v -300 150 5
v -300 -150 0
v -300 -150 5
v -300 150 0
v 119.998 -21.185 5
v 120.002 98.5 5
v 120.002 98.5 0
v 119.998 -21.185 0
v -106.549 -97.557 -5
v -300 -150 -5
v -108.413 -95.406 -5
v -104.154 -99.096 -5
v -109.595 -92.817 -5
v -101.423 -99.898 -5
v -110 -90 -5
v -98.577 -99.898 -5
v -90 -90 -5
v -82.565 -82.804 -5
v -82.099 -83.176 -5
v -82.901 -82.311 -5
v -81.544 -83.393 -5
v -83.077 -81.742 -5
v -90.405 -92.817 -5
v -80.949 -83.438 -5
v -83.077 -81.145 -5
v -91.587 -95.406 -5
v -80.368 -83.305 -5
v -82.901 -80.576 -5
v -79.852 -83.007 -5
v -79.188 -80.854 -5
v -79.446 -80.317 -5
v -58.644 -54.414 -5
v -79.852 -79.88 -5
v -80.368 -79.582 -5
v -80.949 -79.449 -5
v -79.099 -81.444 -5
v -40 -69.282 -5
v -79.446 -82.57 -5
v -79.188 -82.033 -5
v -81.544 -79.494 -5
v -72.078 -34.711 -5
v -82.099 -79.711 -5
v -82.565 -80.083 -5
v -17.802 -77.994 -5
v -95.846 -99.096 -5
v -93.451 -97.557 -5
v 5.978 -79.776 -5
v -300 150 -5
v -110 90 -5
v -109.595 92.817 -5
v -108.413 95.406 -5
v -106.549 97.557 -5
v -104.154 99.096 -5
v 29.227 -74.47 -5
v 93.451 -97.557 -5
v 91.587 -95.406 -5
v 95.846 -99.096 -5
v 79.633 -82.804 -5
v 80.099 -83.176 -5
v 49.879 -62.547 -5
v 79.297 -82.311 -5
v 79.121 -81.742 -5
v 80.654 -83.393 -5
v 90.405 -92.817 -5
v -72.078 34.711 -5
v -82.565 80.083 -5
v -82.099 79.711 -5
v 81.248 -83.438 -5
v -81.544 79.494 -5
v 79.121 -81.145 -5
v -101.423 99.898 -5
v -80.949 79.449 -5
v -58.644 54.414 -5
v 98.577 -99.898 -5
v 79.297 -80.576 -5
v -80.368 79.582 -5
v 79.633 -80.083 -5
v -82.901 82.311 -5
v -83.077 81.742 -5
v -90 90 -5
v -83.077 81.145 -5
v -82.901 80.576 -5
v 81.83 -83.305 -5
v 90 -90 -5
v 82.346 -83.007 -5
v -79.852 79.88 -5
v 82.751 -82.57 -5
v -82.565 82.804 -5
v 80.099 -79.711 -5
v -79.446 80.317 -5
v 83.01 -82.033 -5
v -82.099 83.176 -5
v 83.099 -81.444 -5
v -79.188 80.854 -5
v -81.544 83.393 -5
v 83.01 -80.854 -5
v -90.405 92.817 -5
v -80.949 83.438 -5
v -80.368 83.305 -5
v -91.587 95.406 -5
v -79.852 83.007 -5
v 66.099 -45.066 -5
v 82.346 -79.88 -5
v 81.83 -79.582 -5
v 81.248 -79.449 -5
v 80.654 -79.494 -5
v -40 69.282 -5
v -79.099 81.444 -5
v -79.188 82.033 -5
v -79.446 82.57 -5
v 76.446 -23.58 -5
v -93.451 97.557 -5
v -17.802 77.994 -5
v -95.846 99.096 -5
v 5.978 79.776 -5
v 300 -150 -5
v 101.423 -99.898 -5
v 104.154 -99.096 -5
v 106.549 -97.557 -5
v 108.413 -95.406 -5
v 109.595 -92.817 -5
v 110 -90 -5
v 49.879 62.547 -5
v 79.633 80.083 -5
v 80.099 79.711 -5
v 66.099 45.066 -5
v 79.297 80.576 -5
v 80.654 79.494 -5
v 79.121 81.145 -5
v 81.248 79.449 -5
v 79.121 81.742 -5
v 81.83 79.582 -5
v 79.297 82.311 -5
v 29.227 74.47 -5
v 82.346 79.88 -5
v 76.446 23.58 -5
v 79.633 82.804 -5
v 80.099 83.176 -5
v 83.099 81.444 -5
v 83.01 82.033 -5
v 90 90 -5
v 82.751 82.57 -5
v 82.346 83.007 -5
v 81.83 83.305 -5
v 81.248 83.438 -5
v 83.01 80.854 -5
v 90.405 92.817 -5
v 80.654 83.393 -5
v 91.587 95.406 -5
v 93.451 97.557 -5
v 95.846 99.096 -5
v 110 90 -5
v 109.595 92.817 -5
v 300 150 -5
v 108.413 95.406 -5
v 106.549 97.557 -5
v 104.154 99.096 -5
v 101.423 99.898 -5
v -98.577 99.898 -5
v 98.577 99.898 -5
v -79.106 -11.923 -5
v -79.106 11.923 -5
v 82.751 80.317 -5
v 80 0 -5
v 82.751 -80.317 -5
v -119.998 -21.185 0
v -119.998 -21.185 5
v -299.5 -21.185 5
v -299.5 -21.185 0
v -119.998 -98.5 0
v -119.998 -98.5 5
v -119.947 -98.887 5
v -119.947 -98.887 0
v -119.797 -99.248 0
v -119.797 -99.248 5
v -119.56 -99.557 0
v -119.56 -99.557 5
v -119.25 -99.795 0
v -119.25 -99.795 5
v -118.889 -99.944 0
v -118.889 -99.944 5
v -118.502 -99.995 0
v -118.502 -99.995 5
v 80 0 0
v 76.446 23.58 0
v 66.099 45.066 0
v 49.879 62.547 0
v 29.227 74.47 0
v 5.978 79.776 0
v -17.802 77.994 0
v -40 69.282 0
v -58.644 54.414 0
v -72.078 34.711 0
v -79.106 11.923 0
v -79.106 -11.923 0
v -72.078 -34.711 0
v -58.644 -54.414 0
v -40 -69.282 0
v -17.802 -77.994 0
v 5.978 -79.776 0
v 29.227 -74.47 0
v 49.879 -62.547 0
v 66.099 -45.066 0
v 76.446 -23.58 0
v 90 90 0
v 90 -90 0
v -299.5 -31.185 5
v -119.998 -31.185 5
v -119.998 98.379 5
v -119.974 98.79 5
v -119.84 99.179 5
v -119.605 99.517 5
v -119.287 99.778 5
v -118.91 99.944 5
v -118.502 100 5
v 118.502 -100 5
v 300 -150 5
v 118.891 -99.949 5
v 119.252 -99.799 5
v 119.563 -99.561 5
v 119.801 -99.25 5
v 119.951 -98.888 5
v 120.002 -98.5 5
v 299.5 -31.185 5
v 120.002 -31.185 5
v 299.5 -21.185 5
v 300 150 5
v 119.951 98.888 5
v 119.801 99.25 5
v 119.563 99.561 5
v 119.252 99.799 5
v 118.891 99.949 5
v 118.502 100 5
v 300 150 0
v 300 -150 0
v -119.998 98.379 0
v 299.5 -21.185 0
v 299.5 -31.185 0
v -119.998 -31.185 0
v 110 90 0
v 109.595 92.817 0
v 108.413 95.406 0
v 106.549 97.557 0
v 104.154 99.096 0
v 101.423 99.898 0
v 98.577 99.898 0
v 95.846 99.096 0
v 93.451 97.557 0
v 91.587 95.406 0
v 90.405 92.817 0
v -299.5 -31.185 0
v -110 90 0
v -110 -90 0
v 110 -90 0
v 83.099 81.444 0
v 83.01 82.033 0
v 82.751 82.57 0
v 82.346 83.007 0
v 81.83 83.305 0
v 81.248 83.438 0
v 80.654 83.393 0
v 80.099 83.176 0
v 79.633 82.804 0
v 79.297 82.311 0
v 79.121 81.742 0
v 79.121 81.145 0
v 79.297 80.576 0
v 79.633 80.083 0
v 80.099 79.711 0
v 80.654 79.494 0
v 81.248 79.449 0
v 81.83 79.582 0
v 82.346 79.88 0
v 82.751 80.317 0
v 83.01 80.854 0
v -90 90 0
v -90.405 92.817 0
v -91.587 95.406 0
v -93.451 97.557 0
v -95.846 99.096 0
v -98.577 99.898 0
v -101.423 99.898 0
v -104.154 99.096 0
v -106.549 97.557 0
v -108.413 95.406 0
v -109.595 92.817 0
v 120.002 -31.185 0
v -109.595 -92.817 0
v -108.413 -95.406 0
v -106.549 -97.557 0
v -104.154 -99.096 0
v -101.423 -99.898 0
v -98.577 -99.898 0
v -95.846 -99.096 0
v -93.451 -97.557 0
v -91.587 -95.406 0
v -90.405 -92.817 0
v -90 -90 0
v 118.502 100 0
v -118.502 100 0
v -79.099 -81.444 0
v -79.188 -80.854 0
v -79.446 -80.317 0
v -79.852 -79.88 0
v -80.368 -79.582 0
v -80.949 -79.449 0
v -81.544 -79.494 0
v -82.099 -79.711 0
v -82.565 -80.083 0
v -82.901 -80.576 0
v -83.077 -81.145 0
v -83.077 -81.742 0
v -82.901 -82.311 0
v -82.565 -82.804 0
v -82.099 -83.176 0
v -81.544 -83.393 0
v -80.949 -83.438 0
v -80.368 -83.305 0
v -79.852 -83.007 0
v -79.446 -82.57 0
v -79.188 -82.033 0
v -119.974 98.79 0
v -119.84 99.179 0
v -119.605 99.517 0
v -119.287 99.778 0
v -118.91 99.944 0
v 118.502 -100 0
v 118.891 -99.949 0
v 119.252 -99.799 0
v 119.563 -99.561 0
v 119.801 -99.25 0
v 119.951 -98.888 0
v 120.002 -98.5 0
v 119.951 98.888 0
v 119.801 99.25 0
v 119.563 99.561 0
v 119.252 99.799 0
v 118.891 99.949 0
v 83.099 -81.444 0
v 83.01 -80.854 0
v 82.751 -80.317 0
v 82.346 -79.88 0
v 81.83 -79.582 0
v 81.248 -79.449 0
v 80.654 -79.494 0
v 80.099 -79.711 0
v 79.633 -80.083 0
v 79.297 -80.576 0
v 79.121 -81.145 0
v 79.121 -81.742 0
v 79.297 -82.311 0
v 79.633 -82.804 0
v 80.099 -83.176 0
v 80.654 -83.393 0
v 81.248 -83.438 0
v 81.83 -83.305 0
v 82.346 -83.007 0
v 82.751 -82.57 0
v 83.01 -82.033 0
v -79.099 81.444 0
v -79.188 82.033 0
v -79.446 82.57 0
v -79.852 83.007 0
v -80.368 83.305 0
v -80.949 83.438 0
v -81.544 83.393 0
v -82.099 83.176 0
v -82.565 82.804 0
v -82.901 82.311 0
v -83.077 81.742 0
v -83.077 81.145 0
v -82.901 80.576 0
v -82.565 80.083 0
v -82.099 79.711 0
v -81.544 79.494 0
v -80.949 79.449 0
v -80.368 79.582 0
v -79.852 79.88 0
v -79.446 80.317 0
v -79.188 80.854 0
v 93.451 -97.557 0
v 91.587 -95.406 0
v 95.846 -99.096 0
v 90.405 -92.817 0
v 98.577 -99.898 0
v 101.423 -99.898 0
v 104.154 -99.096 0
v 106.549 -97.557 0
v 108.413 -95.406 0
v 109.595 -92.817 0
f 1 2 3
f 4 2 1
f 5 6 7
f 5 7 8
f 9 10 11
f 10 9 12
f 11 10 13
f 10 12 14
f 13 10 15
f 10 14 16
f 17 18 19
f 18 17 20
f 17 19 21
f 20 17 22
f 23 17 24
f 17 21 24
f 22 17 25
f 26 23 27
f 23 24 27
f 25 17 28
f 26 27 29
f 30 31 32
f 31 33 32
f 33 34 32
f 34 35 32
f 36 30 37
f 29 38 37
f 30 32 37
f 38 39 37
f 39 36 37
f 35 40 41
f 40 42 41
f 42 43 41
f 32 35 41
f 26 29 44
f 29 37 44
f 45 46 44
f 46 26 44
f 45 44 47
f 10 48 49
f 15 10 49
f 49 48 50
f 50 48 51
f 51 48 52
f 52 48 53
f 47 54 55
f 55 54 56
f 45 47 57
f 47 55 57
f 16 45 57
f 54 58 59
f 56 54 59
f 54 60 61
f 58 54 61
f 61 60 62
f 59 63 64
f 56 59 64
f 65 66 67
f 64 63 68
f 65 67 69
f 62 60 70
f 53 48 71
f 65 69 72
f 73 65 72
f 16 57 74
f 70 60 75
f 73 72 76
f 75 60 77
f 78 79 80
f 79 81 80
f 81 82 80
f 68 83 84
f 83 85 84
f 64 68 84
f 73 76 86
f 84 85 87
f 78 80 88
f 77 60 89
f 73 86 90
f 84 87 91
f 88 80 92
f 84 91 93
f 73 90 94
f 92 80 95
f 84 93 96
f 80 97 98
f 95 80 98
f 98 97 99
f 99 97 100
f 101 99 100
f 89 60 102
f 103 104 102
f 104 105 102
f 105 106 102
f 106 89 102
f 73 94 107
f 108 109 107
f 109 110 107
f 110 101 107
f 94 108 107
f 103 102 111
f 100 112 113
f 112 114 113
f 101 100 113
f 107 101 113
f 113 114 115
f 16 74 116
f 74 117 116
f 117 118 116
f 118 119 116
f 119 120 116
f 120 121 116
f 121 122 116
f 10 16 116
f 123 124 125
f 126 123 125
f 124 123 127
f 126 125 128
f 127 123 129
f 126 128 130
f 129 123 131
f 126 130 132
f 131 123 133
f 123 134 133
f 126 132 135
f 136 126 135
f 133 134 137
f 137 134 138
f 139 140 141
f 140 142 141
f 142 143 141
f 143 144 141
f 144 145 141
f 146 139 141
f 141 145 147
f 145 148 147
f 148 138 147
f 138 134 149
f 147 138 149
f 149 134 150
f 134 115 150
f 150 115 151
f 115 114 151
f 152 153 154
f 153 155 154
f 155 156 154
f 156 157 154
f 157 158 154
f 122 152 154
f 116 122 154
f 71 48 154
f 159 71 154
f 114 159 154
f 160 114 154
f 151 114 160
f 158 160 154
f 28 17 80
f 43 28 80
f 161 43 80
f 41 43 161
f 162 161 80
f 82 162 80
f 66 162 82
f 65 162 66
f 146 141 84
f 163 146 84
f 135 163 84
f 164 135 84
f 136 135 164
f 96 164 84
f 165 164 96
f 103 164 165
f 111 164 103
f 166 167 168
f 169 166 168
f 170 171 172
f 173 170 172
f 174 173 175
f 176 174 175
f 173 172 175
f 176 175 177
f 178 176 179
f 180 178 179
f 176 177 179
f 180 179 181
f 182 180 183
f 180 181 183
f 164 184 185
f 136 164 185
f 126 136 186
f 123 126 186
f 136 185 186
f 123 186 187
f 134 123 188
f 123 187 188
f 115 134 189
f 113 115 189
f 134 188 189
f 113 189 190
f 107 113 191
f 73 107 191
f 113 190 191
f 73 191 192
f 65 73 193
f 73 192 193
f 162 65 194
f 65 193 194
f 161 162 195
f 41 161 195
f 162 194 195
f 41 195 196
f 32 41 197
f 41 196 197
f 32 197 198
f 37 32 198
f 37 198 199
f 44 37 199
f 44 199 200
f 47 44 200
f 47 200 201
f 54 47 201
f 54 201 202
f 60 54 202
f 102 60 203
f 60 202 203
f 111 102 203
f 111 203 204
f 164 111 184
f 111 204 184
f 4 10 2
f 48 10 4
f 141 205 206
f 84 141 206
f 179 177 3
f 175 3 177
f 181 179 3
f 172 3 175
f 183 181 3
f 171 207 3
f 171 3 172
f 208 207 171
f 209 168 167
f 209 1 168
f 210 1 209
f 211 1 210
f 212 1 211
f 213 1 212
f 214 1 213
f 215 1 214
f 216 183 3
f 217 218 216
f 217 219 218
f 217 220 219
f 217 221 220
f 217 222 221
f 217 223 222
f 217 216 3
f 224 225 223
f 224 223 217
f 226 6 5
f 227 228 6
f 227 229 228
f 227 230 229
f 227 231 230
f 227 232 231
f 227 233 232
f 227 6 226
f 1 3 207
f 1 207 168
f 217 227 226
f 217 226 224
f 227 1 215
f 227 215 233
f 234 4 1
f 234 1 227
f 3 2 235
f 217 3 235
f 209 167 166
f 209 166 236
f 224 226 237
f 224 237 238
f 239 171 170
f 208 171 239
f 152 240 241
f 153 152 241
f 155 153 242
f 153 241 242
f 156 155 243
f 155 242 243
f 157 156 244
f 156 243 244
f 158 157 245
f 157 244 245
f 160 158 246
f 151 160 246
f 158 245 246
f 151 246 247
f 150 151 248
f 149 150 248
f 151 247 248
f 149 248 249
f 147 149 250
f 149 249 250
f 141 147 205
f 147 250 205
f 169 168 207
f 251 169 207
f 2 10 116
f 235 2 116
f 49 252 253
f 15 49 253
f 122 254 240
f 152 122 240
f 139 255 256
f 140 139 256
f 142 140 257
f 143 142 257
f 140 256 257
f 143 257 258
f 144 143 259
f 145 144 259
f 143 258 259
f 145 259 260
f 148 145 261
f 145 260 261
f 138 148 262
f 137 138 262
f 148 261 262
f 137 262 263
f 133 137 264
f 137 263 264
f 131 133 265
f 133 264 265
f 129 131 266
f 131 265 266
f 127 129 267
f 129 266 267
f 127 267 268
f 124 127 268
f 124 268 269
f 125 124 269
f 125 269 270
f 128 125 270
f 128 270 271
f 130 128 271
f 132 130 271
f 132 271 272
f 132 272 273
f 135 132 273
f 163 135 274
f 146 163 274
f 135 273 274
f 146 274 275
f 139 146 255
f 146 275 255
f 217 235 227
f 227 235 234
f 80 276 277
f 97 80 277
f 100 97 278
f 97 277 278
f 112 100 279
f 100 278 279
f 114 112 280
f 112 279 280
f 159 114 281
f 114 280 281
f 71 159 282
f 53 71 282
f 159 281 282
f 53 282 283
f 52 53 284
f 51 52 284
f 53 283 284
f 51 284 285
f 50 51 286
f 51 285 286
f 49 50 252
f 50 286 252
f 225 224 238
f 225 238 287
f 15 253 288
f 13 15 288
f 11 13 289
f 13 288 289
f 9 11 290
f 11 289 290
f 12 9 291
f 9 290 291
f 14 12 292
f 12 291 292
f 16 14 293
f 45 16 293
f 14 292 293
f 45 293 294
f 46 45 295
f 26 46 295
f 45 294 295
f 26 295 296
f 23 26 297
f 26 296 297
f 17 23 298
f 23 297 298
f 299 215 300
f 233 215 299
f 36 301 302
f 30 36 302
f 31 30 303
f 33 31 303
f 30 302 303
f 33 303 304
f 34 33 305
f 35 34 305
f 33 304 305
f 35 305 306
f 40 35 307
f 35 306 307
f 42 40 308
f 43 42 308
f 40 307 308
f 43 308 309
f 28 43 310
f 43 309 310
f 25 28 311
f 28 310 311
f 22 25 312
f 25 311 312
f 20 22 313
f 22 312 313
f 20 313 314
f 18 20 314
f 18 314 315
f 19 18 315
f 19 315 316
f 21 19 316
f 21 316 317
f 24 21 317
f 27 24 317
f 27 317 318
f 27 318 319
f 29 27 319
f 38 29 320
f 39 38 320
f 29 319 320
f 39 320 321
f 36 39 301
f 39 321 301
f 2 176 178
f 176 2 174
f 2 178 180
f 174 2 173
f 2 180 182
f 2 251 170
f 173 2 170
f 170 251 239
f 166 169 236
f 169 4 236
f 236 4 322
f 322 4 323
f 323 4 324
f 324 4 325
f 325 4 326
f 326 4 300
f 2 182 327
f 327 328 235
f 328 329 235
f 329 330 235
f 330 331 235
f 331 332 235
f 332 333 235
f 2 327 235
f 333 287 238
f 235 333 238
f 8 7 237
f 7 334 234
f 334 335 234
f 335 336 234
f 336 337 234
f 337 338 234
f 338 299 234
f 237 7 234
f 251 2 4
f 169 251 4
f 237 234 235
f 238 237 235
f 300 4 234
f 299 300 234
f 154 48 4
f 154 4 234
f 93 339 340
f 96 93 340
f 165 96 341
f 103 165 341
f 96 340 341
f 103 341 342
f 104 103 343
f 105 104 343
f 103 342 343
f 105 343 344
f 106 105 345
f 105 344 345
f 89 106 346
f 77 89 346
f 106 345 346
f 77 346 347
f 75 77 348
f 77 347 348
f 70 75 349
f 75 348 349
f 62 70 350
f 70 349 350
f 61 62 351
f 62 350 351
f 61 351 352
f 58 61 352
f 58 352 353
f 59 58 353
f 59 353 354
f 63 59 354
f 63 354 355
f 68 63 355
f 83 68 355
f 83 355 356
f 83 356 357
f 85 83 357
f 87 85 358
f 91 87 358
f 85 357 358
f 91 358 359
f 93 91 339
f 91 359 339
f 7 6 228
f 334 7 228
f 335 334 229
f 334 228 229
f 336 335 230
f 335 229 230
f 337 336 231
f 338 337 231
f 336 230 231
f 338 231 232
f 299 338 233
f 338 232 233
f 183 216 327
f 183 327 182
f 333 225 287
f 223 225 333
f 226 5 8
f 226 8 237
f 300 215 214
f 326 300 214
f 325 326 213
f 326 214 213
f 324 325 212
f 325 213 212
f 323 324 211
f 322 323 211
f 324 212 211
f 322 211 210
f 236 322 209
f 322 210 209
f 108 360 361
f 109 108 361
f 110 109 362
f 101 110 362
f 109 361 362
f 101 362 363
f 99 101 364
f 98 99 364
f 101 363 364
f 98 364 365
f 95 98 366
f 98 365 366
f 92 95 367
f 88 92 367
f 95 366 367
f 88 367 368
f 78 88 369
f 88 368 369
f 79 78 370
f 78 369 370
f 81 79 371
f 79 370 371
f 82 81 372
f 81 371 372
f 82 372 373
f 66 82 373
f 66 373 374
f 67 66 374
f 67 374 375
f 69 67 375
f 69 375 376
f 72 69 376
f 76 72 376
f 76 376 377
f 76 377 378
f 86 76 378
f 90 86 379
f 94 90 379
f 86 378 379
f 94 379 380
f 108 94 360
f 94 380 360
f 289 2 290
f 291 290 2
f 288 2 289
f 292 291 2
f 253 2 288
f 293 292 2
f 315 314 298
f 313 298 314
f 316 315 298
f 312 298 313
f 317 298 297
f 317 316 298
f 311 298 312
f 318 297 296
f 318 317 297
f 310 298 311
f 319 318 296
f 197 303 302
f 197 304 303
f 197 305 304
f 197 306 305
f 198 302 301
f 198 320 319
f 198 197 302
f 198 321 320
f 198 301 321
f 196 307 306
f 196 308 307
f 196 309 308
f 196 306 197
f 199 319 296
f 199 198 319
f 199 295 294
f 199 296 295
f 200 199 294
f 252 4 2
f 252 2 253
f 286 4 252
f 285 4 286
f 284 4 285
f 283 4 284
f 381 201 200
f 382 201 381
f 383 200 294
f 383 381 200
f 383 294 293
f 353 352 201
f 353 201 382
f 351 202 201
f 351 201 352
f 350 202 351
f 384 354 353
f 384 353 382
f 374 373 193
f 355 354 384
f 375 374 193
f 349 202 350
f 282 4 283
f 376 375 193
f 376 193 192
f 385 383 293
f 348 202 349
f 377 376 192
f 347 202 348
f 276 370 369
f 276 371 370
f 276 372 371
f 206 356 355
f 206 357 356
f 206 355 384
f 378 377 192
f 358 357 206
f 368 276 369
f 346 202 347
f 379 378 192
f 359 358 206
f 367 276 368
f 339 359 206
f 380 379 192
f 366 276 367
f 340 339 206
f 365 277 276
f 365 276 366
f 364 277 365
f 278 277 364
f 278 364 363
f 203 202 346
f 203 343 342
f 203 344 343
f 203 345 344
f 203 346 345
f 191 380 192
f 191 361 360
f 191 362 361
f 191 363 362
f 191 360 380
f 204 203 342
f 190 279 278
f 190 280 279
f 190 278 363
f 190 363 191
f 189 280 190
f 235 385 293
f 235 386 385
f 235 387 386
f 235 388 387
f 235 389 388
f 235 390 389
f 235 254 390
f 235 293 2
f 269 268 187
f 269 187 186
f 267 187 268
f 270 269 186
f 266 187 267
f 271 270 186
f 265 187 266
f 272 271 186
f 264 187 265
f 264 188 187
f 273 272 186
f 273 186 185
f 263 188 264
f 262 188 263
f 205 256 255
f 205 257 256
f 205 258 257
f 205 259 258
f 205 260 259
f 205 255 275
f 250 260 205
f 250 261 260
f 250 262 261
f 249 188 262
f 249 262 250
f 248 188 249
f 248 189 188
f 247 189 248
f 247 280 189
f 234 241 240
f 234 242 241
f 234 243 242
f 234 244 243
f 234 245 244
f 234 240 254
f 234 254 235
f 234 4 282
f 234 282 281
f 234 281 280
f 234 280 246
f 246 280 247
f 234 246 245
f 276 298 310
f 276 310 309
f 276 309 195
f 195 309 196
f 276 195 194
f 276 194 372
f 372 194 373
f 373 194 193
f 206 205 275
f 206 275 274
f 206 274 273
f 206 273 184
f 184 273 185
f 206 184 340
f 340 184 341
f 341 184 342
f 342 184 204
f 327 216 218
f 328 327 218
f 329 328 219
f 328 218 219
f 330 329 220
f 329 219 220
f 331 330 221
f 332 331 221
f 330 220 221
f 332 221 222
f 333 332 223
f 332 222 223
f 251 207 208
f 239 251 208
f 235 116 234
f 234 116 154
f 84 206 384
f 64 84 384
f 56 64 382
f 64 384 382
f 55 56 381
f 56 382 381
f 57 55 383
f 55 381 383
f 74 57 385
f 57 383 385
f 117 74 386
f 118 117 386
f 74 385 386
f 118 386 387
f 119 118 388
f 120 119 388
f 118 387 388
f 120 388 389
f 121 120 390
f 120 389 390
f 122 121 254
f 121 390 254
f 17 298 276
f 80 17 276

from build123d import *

# Parameters (mm, degrees)
SKETCH_W        = 600
SKETCH_H        = 300
PAD_DEPTH       = 5
POCKET_DEPTH    = 5
SKETCH002_W     = 600
SKETCH002_H     = 300
PAD001_DEPTH    = 5
SKETCH003_R     = 80
SKETCH003_R_2   = 2
POCKET001_DEPTH = 5


with BuildPart() as base01:
    # Sketch → Pad (new body)
    with BuildSketch(Plane.XY):
        Rectangle(SKETCH_W, SKETCH_H)
    extrude(amount=PAD_DEPTH)

    # Sketch001 (on Face6 of Pad) → Pocket (cut)
    with BuildSketch(Plane.XY.offset(5)):
        with BuildLine():
            Line((-118.502435, 100), (118.502435, 100))
            ThreePointArc((120.002435, 98.499939), (119.563116, 99.560639), (118.502435, 100))
            Line((120.002435, 98.499939), (119.997565, -21.185131))
            Line((119.997565, -21.185131), (299.5, -21.185131))
            Line((299.5, -21.185131), (299.5, -31.185131))
            Line((299.5, -31.185131), (120.002435, -31.185131))
            Line((120.002435, -31.185131), (120.002435, -98.5))
            ThreePointArc((118.502404, -100), (119.563084, -99.560671), (120.002435, -98.5))
            Line((118.502404, -100), (-118.502465, -99.995131))
            ThreePointArc((-119.997565, -98.5), (-119.559663, -99.557206), (-118.502465, -99.995131))
            Line((-119.997565, -98.5), (-119.997565, -31.185131))
            Line((-299.5, -31.185131), (-119.997565, -31.185131))
            Line((-299.5, -21.185131), (-299.5, -31.185131))
            Line((-119.997565, -21.185131), (-299.5, -21.185131))
            Line((-119.997565, -21.185131), (-119.997565, 98.379233))
            ThreePointArc((-118.502435, 100), (-119.604966, 99.517067), (-119.997565, 98.379233))
        make_face()
    extrude(amount=-POCKET_DEPTH, mode=Mode.SUBTRACT)


with BuildPart() as base002:
    # Sketch002 → Pad001 (new body)
    with BuildSketch(Plane.XY.offset(-5)):
        Rectangle(SKETCH002_W, SKETCH002_H)
    extrude(amount=PAD001_DEPTH)

    # Sketch003 (on Face6 of Pad001) → Pocket001 (cut)
    with BuildSketch(Plane.XY):
        Circle(SKETCH003_R)
        with Locations((-81.098877, 81.443512)):
            Circle(SKETCH003_R_2)
        with Locations((81.098877, 81.443512)):
            Circle(SKETCH003_R_2)
        with Locations((-81.098877, -81.443512)):
            Circle(SKETCH003_R_2)
        with Locations((81.098877, -81.443512)):
            Circle(SKETCH003_R_2)
        with BuildLine():
            ThreePointArc((-90, 90), (-100, 100), (-110, 90))
            Line((-110, 90), (-110, -90))
            ThreePointArc((-110, -90), (-100, -100), (-90, -90))
            Line((-90, -90), (-90, 90))
        make_face()
        with BuildLine():
            ThreePointArc((110, 90), (100, 100), (90, 90))
            Line((90, 90), (90, -90))
            ThreePointArc((90, -90), (100, -100), (110, -90))
            Line((110, -90), (110, 90))
        make_face()
    extrude(amount=-POCKET001_DEPTH, mode=Mode.SUBTRACT)


solid = Compound([base01.part, base002.part])
